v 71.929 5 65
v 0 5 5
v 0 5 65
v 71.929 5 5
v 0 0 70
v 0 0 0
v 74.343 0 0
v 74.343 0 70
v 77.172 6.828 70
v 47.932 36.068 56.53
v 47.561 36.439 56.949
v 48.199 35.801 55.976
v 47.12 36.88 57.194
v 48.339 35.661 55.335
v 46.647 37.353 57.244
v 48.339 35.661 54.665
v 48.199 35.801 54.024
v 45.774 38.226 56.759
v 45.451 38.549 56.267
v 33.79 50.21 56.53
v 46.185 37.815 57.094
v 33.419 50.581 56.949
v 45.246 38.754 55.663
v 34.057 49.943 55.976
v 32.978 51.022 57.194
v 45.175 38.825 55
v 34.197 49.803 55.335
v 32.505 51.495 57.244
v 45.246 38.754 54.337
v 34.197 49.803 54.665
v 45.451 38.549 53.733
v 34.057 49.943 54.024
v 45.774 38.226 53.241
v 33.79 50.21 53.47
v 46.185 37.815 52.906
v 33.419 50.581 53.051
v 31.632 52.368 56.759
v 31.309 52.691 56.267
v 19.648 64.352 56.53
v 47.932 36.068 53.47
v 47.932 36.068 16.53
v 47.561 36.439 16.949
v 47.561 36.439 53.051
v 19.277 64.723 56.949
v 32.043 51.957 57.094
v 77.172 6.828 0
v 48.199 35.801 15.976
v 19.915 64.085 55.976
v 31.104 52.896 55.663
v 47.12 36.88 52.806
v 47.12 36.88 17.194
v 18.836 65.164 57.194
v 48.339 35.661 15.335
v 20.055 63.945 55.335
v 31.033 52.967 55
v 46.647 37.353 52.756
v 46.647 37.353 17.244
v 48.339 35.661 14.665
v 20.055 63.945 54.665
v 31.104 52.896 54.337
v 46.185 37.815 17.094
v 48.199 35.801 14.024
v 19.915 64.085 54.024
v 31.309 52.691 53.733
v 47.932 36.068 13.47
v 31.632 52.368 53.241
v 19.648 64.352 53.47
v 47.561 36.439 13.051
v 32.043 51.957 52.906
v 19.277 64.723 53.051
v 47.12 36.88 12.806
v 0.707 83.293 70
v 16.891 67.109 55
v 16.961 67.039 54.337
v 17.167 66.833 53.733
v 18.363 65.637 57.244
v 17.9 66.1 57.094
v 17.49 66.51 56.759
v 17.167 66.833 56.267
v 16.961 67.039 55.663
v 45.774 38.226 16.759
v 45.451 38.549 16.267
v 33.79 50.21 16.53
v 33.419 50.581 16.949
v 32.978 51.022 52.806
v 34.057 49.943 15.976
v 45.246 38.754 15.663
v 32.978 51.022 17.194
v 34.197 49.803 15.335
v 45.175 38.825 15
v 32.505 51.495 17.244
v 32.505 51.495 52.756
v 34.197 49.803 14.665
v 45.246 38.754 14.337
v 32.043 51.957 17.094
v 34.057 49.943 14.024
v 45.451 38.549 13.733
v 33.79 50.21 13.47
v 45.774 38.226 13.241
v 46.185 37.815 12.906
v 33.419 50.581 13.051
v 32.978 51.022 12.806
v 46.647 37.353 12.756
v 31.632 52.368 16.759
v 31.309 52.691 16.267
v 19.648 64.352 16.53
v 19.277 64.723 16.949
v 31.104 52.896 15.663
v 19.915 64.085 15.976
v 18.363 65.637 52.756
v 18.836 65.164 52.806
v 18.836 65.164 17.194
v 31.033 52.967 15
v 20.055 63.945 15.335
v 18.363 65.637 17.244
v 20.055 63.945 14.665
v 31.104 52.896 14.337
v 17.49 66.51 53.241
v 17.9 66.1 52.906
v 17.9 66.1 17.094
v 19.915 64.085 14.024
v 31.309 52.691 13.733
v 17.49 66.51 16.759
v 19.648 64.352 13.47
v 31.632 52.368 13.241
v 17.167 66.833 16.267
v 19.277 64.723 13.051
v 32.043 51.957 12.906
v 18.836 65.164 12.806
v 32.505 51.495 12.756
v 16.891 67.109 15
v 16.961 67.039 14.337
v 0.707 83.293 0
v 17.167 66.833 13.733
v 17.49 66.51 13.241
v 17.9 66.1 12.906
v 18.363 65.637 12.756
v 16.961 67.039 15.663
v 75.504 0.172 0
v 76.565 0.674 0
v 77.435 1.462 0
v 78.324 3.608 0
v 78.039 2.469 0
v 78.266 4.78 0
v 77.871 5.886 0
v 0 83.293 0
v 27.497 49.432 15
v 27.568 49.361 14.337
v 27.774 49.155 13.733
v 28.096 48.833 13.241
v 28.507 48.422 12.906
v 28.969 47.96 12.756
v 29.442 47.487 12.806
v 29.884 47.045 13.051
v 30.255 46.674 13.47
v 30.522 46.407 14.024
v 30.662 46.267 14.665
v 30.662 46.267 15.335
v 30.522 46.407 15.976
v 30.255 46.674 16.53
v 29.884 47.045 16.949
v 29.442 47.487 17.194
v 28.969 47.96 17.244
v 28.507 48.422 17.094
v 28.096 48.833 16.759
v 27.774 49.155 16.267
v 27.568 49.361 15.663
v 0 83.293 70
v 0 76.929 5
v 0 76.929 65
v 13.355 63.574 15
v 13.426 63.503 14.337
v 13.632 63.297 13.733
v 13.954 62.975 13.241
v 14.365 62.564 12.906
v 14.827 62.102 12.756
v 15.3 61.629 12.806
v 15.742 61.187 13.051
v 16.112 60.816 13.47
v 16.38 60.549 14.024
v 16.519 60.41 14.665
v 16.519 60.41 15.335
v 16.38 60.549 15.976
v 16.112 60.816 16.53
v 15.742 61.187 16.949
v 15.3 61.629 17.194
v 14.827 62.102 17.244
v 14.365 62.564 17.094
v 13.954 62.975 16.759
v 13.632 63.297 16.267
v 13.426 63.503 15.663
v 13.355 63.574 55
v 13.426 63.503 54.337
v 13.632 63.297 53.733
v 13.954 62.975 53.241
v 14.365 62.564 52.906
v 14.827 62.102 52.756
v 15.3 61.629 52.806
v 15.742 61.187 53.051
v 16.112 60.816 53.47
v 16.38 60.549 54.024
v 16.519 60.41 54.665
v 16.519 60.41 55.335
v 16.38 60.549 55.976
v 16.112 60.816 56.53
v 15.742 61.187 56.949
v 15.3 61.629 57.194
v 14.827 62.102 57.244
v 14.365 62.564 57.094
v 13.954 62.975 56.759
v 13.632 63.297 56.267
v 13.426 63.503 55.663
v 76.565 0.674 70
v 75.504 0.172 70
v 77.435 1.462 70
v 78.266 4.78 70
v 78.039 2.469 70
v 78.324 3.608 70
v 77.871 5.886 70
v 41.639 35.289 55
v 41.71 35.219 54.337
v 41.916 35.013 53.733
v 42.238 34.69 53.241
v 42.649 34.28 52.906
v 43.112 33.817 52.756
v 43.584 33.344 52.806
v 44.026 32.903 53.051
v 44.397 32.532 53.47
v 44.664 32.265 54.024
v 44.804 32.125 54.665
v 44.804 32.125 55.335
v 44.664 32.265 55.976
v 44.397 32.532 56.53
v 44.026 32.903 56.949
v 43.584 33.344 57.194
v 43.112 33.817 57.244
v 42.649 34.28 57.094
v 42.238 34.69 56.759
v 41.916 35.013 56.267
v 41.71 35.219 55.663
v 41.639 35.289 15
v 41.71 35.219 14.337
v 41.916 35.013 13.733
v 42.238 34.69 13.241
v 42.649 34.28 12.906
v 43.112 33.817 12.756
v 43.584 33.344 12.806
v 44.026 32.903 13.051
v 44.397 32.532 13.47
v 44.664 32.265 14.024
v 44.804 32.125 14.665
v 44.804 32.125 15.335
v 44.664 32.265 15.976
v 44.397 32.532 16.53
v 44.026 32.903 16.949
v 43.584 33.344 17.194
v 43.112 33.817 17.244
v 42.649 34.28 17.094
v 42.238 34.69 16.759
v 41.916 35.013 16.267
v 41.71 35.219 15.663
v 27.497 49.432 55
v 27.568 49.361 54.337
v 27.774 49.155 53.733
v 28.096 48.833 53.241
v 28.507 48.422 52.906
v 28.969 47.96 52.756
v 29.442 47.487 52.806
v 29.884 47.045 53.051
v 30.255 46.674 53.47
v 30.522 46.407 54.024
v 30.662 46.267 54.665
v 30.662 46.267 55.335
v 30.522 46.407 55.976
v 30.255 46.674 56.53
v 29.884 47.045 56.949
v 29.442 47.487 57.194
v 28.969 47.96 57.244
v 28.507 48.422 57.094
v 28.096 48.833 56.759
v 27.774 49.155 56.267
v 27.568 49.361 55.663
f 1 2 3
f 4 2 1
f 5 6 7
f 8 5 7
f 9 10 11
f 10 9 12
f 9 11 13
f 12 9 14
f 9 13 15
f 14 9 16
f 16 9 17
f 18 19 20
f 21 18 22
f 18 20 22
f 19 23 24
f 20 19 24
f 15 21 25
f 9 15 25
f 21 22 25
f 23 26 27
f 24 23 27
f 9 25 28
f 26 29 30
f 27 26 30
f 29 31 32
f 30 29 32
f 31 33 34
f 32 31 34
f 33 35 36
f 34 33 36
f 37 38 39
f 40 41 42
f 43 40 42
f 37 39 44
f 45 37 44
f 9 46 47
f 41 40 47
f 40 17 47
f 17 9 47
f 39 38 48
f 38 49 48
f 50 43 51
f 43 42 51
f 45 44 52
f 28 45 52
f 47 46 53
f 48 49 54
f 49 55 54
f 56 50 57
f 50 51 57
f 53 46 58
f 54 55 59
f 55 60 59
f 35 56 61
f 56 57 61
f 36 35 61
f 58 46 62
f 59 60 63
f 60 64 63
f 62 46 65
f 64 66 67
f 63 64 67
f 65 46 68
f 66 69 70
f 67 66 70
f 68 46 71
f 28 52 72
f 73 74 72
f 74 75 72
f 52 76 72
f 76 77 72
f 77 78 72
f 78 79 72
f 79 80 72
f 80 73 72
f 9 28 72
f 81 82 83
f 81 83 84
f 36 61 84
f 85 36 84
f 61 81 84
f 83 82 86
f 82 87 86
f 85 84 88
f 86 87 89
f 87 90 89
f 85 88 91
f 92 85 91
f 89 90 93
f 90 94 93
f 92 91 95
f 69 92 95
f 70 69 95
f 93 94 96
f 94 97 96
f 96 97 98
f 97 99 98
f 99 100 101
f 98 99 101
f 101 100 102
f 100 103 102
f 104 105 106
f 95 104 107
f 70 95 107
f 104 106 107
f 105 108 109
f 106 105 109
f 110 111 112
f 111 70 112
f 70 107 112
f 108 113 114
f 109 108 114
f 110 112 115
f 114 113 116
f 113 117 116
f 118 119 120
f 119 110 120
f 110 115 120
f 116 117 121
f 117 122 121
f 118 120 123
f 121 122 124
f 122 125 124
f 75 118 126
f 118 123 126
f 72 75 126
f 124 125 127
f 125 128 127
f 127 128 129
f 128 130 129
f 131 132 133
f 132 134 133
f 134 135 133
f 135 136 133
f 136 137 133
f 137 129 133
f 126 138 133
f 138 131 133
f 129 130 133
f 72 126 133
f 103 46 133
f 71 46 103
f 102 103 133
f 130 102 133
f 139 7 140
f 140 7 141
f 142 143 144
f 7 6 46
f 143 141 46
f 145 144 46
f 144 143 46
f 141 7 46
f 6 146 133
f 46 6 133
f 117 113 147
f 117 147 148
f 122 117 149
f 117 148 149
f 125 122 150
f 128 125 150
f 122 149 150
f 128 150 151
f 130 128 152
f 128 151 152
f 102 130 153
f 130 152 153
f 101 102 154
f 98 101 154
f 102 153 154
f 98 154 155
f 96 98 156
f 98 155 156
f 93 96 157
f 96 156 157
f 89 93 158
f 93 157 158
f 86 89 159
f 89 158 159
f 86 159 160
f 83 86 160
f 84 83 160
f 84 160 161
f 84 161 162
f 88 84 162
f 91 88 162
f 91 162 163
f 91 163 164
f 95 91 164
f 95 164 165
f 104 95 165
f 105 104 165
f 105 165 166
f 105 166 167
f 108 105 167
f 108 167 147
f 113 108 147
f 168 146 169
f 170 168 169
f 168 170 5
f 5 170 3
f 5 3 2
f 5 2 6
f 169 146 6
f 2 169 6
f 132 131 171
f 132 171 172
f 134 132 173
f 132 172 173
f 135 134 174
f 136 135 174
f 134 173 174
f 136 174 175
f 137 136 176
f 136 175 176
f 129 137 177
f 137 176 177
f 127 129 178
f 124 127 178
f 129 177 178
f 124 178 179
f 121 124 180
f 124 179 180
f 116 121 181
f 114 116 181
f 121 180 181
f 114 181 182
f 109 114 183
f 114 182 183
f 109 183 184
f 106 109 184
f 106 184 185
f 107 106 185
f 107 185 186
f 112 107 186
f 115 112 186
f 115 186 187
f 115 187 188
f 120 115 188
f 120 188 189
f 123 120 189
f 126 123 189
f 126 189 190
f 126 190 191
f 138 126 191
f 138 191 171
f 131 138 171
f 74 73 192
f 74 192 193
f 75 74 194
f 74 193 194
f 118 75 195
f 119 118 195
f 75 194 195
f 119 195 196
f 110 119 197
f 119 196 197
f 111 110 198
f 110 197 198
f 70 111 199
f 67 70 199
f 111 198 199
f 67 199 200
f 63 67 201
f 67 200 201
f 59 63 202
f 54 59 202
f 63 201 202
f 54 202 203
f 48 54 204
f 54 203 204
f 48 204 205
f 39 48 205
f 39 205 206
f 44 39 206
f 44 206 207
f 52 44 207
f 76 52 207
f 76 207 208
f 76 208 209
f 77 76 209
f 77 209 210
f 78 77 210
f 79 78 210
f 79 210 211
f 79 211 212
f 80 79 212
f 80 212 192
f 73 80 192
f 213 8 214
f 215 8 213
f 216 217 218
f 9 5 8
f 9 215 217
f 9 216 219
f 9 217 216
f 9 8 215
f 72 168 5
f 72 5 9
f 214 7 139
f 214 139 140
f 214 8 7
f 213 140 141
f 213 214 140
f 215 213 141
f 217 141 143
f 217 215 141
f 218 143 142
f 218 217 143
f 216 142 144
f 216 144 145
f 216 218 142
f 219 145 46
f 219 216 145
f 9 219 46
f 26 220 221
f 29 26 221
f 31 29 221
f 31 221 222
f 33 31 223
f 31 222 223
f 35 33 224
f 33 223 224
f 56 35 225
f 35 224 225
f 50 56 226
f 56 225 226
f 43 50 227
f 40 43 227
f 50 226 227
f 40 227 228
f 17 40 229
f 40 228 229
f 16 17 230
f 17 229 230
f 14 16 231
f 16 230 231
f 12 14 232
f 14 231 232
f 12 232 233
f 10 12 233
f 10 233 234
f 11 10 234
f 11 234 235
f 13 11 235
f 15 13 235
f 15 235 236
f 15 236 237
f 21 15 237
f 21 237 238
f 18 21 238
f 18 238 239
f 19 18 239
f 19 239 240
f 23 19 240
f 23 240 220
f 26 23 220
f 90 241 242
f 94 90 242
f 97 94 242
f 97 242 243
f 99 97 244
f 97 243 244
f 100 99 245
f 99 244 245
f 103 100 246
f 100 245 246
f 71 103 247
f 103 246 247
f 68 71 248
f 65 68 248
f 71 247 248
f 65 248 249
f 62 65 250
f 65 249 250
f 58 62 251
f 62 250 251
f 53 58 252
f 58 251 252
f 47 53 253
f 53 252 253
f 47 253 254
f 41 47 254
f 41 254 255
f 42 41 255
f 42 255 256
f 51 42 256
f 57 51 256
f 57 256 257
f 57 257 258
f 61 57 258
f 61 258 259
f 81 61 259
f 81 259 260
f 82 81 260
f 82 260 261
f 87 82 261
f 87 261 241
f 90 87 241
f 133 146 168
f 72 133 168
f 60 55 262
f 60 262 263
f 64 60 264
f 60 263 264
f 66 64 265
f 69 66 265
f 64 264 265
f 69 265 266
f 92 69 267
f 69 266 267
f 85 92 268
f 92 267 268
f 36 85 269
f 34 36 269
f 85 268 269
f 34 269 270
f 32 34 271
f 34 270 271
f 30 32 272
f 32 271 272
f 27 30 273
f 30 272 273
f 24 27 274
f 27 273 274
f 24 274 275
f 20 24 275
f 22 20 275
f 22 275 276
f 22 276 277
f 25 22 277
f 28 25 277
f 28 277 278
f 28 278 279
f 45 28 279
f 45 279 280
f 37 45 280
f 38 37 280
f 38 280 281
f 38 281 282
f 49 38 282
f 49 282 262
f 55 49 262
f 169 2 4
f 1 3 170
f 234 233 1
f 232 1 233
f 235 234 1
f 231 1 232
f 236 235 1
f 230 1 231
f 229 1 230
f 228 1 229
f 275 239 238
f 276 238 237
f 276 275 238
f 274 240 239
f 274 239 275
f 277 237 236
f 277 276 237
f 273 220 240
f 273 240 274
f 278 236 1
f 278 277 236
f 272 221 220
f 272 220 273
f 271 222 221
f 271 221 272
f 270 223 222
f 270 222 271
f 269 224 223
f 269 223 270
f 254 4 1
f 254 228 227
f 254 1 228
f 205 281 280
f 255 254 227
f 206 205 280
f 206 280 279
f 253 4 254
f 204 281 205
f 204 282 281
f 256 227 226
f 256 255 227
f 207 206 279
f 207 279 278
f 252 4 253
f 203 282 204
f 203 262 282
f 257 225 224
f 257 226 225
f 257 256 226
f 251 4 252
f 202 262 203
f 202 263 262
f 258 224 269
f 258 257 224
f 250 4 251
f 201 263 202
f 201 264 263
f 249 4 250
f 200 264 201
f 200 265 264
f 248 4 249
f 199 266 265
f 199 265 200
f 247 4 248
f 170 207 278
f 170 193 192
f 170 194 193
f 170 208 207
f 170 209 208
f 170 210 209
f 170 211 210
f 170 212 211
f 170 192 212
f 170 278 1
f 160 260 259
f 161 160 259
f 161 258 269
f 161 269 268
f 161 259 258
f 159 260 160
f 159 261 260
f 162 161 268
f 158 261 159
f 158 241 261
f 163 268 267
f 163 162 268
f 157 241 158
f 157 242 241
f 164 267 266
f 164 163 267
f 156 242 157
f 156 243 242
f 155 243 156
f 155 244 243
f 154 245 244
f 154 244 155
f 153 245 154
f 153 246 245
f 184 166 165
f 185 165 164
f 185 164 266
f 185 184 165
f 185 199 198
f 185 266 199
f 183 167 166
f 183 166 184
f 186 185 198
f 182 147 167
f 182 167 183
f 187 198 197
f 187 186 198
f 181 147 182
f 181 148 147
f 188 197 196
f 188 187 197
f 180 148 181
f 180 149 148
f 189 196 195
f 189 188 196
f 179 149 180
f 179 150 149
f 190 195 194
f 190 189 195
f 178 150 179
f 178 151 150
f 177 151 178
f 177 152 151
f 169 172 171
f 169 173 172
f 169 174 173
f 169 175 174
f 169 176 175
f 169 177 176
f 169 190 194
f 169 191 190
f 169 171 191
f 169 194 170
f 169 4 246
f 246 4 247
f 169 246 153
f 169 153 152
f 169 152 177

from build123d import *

# Parameters (mm, degrees)
EXTRUDE_1_DEPTH             = 70
FILLET_1_R                  = 4
CHAMFER_1_SIZE              = 1
CHAMFER_1_SIZE2             = 0.707106781
SHELL_START                 = 5
SHELL_1_DEPTH               = 60
HOLE_WIZARD_4_5_4_5_1_D     = 4.5
HOLE_WIZARD_4_5_4_5_1_DEPTH = 10
HOLE_WIZARD_4_5_4_5_1_TIP   = 1.351936393


# Read off the part's stored shape, not the designer's step: 抽壳1
with BuildPart() as part:
    # 草图1 → 凸台-拉伸1 (new body)
    with BuildSketch(Plane.XY):
        Polygon((0, 0), (84, 0), (0, 84), align=None)
    extrude(amount=EXTRUDE_1_DEPTH)

    # 圆角1
    fillet_1_edges = [part.edges().sort_by_distance(p)[0] for p in [
        (84, 0, 35),
    ]]
    fillet(fillet_1_edges, radius=FILLET_1_R)

    # 倒角1
    chamfer_1_edges = [part.edges().sort_by_distance(p)[0] for p in [
        (0, 84, 35),
    ]]
    chamfer_1_side = [part.faces().sort_by_distance(p)[0] for p in [
        (38.585786438, 45.414213562, 35),
    ]]
    chamfer(chamfer_1_edges, length=CHAMFER_1_SIZE, length2=CHAMFER_1_SIZE2, reference=chamfer_1_side[0])

    # 抽壳1 outline → 抽壳1 (cut)
    with BuildSketch(Plane.XY.offset(SHELL_START)):
        Polygon((0, 5), (71.928932188, 5), (0, 76.928932188), align=None)
    extrude(amount=SHELL_1_DEPTH, mode=Mode.SUBTRACT)

    # Ø4.5 (4.5) 直径孔1
    with Locations(Plane(origin=(42, 42, 0), x_dir=(0.7071067811865475, -0.7071067811865477, 0), z_dir=(0.7071067811865477, 0.7071067811865475, 0))):
        with Locations((-33.25988463, -55), (-13.25988463, -55), (6.74011537, -55), (6.74011537, -15), (-13.25988463, -15), (-33.25988463, -15)):
            Hole(HOLE_WIZARD_4_5_4_5_1_D / 2, depth=HOLE_WIZARD_4_5_4_5_1_DEPTH)
            with Locations((0, 0, -(HOLE_WIZARD_4_5_4_5_1_DEPTH + HOLE_WIZARD_4_5_4_5_1_TIP / 2))):  # 118° drill point
                Cone(0, HOLE_WIZARD_4_5_4_5_1_D / 2, HOLE_WIZARD_4_5_4_5_1_TIP, mode=Mode.SUBTRACT)


solid = part.part
